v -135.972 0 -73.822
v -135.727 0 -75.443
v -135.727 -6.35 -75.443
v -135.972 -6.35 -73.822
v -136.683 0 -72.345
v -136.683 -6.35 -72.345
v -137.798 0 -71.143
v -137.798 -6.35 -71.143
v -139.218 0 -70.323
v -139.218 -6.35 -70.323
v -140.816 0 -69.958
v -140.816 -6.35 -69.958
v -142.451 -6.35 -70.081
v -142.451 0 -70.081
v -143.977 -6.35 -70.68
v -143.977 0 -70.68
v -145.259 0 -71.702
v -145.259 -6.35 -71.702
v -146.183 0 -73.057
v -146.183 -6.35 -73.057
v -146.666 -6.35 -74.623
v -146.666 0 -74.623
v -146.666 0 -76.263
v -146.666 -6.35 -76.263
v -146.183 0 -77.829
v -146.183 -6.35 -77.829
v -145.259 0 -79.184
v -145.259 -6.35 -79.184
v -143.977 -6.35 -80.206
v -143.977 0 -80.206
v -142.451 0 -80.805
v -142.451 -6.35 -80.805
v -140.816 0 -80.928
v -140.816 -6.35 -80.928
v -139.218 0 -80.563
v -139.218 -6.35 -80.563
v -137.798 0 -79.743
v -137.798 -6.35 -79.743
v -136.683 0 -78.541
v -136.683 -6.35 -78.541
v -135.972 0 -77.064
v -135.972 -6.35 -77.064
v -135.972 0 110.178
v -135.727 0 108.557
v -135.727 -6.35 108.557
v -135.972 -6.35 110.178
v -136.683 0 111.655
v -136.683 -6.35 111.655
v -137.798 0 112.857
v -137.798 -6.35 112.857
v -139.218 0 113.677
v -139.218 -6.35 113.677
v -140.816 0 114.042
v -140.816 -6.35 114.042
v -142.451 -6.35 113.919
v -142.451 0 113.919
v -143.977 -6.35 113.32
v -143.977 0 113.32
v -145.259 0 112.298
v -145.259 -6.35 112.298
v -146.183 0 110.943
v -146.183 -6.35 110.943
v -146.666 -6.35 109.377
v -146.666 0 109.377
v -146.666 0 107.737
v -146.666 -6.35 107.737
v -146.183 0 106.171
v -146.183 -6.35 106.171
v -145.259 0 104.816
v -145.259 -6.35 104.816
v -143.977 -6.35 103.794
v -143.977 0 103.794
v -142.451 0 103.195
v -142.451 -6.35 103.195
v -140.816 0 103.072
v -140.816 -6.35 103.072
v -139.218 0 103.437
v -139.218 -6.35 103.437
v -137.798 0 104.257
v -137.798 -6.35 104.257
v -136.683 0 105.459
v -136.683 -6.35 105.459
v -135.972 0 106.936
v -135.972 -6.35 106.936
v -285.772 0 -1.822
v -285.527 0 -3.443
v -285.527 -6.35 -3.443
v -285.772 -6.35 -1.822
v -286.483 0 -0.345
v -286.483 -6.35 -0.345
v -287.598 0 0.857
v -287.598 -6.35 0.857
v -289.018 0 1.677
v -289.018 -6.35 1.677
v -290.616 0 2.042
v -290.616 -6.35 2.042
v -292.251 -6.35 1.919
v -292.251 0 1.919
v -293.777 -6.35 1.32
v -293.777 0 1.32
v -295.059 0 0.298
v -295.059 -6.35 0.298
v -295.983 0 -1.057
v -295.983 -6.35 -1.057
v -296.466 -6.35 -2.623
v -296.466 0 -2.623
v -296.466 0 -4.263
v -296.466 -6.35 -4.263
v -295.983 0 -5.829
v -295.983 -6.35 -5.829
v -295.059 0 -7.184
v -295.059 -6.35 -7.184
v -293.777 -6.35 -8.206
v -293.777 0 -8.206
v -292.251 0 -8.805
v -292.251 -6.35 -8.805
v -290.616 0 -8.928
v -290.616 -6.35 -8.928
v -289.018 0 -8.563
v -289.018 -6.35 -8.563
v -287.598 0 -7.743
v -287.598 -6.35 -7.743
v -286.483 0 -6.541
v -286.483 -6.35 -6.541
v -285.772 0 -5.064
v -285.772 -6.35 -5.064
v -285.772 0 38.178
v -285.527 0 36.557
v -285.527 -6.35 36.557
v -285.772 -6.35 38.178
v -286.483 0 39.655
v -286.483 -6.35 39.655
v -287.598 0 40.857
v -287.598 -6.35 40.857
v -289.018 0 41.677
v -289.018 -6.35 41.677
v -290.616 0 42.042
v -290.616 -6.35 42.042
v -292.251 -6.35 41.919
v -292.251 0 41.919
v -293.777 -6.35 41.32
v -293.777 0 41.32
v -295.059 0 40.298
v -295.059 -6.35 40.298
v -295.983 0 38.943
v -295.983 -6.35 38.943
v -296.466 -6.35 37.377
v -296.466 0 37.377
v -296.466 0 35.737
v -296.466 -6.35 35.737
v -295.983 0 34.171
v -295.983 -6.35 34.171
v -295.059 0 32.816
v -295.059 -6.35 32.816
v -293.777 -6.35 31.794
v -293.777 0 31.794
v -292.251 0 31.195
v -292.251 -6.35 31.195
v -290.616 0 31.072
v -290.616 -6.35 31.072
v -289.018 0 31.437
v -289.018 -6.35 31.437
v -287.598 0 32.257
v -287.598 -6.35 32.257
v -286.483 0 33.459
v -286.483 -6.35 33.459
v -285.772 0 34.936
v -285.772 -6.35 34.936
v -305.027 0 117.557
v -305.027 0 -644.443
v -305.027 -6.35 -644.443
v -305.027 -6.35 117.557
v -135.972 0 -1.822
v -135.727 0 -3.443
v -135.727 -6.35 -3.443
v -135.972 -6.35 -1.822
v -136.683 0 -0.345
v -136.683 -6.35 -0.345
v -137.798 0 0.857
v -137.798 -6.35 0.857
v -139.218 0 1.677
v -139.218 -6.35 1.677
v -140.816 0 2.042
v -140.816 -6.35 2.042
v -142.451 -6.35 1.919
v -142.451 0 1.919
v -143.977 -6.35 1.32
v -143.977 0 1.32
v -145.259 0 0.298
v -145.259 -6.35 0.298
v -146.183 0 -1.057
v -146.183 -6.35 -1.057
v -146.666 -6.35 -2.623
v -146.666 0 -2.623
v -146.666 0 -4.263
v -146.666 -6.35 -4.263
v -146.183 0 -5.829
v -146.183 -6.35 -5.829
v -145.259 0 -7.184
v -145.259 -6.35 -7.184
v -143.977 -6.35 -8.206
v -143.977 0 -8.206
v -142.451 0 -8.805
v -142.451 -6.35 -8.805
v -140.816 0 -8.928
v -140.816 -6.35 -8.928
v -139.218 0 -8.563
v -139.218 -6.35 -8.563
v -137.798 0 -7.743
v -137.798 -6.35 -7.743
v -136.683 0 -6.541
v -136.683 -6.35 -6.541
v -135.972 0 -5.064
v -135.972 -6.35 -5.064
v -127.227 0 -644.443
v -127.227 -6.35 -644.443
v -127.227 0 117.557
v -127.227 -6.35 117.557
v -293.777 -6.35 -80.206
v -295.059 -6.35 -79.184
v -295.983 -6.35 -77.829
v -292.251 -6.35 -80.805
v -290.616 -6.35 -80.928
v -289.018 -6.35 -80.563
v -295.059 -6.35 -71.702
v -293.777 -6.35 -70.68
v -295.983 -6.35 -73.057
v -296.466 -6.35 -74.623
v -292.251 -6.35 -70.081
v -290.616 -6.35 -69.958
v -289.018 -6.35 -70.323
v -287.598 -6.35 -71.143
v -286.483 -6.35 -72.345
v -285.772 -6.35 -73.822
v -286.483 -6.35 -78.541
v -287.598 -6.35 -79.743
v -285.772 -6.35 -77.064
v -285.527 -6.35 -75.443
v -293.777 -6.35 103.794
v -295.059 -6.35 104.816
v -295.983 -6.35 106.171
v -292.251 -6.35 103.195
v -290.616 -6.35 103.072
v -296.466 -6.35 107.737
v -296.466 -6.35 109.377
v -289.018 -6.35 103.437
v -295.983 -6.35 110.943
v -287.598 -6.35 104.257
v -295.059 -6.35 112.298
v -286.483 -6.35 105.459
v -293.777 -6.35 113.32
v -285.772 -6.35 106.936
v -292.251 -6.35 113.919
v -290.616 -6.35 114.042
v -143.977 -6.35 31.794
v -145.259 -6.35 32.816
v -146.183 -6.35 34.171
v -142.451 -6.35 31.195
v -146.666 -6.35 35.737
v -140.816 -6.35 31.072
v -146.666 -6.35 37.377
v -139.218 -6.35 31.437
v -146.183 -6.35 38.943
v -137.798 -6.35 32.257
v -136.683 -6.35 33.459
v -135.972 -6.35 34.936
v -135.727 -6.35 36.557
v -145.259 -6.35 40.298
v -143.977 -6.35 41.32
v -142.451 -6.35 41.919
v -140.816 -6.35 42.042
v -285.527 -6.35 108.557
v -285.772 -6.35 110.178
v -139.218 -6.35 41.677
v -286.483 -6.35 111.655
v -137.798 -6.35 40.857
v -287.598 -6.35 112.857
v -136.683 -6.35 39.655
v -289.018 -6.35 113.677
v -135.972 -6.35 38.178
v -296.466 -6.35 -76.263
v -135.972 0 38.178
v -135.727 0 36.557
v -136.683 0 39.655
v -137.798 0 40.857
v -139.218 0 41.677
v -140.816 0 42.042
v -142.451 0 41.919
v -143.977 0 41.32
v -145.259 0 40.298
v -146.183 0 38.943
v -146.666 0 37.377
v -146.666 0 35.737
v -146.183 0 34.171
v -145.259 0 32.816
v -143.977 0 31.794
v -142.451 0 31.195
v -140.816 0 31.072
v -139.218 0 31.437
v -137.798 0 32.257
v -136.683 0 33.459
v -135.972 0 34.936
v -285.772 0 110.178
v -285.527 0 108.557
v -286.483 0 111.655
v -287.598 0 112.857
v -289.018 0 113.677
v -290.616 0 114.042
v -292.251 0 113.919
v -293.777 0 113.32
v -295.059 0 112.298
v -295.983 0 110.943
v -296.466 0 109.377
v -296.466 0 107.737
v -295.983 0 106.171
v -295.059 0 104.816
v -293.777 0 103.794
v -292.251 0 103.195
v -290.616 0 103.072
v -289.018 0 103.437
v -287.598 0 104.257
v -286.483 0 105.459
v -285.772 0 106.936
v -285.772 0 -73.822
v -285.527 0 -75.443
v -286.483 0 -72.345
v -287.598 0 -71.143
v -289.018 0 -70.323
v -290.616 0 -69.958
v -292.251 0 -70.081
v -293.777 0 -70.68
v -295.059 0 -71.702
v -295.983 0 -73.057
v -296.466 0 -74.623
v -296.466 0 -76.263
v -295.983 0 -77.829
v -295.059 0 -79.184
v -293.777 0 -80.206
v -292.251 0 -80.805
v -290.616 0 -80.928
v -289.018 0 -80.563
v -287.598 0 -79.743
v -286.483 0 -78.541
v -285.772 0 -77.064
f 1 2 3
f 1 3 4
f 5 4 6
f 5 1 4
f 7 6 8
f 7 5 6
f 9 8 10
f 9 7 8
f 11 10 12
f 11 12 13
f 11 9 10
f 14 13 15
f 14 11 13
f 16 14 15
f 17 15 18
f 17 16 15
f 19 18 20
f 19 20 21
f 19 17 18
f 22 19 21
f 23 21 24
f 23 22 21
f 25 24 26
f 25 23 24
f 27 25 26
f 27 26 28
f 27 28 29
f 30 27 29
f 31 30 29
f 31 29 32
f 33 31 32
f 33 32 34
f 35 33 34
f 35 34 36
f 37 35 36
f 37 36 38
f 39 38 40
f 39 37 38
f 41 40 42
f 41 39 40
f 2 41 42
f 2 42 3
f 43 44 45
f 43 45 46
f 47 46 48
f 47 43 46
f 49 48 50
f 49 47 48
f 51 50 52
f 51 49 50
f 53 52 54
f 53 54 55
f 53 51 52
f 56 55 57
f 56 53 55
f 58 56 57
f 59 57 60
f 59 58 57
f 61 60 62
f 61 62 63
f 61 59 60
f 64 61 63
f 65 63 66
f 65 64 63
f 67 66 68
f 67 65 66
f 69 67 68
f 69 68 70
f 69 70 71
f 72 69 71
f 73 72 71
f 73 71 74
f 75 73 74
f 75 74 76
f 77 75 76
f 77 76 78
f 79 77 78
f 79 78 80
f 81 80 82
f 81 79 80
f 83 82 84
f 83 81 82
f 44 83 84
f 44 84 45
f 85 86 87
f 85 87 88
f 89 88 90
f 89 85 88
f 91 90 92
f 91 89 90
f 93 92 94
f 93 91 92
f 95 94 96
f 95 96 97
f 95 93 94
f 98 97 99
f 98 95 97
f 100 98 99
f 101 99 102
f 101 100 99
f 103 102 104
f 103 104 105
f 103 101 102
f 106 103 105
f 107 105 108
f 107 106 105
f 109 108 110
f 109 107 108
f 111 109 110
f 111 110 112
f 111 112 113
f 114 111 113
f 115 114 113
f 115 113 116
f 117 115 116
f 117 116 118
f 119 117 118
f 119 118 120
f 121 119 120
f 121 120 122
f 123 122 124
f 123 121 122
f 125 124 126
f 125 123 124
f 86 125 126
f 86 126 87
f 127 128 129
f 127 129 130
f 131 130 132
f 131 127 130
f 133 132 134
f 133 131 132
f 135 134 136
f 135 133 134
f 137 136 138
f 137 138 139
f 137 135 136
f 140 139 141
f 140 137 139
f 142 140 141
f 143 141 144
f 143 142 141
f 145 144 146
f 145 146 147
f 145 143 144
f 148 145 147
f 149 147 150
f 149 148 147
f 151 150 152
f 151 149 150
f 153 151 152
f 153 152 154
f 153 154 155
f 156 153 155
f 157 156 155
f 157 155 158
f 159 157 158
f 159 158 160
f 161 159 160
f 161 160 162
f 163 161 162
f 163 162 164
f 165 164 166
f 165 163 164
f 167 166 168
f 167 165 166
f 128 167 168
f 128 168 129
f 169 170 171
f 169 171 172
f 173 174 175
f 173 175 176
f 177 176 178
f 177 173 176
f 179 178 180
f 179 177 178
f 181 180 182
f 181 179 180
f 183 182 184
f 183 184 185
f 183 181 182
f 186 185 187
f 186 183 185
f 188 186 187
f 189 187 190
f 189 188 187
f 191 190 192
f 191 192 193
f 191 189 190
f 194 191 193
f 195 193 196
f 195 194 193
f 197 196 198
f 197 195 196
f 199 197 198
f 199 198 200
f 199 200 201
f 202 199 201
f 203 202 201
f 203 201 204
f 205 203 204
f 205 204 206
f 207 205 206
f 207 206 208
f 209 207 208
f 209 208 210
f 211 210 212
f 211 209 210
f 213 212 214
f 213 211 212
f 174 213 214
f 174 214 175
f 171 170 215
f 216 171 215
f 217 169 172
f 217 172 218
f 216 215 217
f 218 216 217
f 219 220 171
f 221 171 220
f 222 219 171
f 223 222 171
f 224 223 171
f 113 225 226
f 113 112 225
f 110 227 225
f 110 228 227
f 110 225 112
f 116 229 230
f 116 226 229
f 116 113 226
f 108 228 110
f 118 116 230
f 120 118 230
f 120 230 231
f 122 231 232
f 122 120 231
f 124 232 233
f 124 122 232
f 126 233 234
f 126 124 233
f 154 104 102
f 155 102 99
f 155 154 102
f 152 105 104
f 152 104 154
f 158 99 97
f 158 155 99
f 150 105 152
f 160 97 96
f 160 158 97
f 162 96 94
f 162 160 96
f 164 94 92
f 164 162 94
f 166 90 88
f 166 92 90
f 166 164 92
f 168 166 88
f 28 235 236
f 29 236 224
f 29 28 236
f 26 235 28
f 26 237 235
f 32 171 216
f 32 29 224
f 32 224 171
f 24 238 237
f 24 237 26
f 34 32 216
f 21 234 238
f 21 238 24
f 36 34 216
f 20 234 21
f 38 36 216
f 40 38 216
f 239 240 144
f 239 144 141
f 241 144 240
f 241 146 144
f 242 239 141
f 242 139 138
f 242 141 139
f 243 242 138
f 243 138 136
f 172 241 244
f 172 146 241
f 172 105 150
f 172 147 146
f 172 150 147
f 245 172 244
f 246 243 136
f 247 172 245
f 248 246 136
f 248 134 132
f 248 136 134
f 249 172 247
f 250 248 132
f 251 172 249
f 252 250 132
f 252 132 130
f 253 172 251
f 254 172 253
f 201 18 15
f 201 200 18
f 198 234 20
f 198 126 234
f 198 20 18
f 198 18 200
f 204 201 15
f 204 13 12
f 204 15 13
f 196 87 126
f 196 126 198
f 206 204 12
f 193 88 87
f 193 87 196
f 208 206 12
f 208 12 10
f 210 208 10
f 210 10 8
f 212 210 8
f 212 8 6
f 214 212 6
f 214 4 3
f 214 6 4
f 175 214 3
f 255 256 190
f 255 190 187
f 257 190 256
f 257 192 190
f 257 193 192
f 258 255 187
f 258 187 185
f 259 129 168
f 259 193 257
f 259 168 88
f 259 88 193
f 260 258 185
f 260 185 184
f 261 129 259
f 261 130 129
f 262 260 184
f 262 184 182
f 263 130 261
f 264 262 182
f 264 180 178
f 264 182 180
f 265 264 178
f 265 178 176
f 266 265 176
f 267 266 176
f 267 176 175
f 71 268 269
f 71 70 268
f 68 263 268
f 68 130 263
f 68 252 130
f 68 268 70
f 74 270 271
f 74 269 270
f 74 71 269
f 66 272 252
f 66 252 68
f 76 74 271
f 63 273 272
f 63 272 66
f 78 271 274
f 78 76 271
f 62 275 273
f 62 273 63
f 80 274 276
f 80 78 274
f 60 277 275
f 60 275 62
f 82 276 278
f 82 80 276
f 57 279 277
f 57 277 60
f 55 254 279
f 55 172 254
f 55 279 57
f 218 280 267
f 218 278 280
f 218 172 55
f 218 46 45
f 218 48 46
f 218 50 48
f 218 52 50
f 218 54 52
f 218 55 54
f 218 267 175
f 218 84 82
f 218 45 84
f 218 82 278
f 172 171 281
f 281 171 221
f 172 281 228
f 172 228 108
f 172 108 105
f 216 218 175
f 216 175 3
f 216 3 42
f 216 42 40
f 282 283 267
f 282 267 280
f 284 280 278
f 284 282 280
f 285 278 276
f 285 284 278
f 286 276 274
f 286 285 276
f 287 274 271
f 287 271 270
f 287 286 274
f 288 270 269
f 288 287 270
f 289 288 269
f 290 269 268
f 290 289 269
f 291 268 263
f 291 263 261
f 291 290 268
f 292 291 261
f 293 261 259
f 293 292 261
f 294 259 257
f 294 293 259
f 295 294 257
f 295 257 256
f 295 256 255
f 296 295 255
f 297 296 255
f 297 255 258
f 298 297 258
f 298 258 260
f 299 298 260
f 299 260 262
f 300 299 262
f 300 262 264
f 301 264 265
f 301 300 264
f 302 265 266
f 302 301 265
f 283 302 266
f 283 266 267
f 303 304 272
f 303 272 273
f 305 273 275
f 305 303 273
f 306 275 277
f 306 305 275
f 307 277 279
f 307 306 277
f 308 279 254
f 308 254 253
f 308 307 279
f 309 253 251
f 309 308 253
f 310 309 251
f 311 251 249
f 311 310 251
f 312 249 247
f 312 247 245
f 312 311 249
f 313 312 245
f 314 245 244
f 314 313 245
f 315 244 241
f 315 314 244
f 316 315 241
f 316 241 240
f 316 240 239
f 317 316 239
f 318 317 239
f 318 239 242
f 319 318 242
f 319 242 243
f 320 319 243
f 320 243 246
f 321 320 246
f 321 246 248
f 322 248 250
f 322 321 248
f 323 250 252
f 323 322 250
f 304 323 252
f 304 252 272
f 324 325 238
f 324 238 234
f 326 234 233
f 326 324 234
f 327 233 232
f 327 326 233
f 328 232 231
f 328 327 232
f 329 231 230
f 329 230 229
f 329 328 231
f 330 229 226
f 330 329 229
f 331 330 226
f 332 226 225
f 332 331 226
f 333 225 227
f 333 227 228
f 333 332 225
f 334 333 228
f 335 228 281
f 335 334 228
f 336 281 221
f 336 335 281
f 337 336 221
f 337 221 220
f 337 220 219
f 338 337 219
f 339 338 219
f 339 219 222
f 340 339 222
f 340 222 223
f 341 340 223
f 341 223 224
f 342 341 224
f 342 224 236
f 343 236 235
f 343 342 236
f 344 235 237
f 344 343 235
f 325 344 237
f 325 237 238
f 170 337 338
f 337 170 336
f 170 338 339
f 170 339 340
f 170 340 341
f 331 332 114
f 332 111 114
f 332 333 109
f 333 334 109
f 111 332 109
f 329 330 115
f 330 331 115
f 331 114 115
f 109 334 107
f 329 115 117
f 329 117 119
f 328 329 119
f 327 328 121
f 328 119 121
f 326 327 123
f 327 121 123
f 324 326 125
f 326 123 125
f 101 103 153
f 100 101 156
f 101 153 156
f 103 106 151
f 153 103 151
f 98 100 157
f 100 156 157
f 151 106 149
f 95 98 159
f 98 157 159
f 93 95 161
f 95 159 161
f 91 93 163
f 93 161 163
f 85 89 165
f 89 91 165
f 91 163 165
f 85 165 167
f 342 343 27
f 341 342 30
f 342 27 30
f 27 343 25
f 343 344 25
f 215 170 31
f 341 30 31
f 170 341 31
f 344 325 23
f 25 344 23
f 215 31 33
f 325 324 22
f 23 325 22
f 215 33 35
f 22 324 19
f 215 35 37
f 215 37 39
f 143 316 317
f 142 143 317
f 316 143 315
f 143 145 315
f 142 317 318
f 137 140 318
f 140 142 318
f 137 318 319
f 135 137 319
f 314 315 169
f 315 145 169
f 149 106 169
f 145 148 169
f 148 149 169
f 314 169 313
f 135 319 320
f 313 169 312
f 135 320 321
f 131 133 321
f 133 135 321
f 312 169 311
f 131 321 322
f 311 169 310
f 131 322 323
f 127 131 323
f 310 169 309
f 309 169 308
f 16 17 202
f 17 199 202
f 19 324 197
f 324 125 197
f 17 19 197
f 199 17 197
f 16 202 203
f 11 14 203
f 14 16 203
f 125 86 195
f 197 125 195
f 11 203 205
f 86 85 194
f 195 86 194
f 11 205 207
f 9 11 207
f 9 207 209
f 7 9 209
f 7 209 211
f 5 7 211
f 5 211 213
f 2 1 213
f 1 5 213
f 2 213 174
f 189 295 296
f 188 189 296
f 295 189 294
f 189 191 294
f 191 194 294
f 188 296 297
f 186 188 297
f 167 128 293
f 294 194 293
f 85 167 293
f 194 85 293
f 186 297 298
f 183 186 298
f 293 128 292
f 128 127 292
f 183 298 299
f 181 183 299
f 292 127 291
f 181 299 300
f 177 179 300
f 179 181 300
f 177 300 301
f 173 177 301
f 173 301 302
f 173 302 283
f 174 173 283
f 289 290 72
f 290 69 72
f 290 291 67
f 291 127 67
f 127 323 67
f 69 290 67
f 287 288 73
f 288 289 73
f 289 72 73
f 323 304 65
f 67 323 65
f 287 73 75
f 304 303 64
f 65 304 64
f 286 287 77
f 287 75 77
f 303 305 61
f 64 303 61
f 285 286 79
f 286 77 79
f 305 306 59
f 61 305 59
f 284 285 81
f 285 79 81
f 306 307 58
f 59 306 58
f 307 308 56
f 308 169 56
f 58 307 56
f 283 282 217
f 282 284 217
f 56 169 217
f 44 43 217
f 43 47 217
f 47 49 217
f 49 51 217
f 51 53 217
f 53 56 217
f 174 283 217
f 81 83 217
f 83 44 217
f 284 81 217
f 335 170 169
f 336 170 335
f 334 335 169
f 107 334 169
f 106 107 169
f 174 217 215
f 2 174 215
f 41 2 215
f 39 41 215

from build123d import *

# Parameters (mm, degrees)
F0_W     = 177.8
F0_H     = 762
F0_R     = 5.5
F1_DEPTH = 6.35


with BuildPart() as f1:
    # F0 (on Front) → F1 (new body)
    with BuildSketch(Plane.XZ):
        with Locations((-216.127327, -263.443022)):
            Rectangle(F0_W, F0_H)
        with Locations((-291.027327, -75.443022)):
            Circle(F0_R, mode=Mode.SUBTRACT)
        with Locations((-291.027327, -3.443022)):
            Circle(F0_R, mode=Mode.SUBTRACT)
        with Locations((-291.027327, 36.556978)):
            Circle(F0_R, mode=Mode.SUBTRACT)
        with Locations((-291.027327, 108.556978)):
            Circle(F0_R, mode=Mode.SUBTRACT)
        with Locations((-141.227327, -75.443022)):
            Circle(F0_R, mode=Mode.SUBTRACT)
        with Locations((-141.227327, -3.443022)):
            Circle(F0_R, mode=Mode.SUBTRACT)
        with Locations((-141.227327, 36.556978)):
            Circle(F0_R, mode=Mode.SUBTRACT)
        with Locations((-141.227327, 108.556978)):
            Circle(F0_R, mode=Mode.SUBTRACT)
    extrude(amount=F1_DEPTH)


solid = f1.part
